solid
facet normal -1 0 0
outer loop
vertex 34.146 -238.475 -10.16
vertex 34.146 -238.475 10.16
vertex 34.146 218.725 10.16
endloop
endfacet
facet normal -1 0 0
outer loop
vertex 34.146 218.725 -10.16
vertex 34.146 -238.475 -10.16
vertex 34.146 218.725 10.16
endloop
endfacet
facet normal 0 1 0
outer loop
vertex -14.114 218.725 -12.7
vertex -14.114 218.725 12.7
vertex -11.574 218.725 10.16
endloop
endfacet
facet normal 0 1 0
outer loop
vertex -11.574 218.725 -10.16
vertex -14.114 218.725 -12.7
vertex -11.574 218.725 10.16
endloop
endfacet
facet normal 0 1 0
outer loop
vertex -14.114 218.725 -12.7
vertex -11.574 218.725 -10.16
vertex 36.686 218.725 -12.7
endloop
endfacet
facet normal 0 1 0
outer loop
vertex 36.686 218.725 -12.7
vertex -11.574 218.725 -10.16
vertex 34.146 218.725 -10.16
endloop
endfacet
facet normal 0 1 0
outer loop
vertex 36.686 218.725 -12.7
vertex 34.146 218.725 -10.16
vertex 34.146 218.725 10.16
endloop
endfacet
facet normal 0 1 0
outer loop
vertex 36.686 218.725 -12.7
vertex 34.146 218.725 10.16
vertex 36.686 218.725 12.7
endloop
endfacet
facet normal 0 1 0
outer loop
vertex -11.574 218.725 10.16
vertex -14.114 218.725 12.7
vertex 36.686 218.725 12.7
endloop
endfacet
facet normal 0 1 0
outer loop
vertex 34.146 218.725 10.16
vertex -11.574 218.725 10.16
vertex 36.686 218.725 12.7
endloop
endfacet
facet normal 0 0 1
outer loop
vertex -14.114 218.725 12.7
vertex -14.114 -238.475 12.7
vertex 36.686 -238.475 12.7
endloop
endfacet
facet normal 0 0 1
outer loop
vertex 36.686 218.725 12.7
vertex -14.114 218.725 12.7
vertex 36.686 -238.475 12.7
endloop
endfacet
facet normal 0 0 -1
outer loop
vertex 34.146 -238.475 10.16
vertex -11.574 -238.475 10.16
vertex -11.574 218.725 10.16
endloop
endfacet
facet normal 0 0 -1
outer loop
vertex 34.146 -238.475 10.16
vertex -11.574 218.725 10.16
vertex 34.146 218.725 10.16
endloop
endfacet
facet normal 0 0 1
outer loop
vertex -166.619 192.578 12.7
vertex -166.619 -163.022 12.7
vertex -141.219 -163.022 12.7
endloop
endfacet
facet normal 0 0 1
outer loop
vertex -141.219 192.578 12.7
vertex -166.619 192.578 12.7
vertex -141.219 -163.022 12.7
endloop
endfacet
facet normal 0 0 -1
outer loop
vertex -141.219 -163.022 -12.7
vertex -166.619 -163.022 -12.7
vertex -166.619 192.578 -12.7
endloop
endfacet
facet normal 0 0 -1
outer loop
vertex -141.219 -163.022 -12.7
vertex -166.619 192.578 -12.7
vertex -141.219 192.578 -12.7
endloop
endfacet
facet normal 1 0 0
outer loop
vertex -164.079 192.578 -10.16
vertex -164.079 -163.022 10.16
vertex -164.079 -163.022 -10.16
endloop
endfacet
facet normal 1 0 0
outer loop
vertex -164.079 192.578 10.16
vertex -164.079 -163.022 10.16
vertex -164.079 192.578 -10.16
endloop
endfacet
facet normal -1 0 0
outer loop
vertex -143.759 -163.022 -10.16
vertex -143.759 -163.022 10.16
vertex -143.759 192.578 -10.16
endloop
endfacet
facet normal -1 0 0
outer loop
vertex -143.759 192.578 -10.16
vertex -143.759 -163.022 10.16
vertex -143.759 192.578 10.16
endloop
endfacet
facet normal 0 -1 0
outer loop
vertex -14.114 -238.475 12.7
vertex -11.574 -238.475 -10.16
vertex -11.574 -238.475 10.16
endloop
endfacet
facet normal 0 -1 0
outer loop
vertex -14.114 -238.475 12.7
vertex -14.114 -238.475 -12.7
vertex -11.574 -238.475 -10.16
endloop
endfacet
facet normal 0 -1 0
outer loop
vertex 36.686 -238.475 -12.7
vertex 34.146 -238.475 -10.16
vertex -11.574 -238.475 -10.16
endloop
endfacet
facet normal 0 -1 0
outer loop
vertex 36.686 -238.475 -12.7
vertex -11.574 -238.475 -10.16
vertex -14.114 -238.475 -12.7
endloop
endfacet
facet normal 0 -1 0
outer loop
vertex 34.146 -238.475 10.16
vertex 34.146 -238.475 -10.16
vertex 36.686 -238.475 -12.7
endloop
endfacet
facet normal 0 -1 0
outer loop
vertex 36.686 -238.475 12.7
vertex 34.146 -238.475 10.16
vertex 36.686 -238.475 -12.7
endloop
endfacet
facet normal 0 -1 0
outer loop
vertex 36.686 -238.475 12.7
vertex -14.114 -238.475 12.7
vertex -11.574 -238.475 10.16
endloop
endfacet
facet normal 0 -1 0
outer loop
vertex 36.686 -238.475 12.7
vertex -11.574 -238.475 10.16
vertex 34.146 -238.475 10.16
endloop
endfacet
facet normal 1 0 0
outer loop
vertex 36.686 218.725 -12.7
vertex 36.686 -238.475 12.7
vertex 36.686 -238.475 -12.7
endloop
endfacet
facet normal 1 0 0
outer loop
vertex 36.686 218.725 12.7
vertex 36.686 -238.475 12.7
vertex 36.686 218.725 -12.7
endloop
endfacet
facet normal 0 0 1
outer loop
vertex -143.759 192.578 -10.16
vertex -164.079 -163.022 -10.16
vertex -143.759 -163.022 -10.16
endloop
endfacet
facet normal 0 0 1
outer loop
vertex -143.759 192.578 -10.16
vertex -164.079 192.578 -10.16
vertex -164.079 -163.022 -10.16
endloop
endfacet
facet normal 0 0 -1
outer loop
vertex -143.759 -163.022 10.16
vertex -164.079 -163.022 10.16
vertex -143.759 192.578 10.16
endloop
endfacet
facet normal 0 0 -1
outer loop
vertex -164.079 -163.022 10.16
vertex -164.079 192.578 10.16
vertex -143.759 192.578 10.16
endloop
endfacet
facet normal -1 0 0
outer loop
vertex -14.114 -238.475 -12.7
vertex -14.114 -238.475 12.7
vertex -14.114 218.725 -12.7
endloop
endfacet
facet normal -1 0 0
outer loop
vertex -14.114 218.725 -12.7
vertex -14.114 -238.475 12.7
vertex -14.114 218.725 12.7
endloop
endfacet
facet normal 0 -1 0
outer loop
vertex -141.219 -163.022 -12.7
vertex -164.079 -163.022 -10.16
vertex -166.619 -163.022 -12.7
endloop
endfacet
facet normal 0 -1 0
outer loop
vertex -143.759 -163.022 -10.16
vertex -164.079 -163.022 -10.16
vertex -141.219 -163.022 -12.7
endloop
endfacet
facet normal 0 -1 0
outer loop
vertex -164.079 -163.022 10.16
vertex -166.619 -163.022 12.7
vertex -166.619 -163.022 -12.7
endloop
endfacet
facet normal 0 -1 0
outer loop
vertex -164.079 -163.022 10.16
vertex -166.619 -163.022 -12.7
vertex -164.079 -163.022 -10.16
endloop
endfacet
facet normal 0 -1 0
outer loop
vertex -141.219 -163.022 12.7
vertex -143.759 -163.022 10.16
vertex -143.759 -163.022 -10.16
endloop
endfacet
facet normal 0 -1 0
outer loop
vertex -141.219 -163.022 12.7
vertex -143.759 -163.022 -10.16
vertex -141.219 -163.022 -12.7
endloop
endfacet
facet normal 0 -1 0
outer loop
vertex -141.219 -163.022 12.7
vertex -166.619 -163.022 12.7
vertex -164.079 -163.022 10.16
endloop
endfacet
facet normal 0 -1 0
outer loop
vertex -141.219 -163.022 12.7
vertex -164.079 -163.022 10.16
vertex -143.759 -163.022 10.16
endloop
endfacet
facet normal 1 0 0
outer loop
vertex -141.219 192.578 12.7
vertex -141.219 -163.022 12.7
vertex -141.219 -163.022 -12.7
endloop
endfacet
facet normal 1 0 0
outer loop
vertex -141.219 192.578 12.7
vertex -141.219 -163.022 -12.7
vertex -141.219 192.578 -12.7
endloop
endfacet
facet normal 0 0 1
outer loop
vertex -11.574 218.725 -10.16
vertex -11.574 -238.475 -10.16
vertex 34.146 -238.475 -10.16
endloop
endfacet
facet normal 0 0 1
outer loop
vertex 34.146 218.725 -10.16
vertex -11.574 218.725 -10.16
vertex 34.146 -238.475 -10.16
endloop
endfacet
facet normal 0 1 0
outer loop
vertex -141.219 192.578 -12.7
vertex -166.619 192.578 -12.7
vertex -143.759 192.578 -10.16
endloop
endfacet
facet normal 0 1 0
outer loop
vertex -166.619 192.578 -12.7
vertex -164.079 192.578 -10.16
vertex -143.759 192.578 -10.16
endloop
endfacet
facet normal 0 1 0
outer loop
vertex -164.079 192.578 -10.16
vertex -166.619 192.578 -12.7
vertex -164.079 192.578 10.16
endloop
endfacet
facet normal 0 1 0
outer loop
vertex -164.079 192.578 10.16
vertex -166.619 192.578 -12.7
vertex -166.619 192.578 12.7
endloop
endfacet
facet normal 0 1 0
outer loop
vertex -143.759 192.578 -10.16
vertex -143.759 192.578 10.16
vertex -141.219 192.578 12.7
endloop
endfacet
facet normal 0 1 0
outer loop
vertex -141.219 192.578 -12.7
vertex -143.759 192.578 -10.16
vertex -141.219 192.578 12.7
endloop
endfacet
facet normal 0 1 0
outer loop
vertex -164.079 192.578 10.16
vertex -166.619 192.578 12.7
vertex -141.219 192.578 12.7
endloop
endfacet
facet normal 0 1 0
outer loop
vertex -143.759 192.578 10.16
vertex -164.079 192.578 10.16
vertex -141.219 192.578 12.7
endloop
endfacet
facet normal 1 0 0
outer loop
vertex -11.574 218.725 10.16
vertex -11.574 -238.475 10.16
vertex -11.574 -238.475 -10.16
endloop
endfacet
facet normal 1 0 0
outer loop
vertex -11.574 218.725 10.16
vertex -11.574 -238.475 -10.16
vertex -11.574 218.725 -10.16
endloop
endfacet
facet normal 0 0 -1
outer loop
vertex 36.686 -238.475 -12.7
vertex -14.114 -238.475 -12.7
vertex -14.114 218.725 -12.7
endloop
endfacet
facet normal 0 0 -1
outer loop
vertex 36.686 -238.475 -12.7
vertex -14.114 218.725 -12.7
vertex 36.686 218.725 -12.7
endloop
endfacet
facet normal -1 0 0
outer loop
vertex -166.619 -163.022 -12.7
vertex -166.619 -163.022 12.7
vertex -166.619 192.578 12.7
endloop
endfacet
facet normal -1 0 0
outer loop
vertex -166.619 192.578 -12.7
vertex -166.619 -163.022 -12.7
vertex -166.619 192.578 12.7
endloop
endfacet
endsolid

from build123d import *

# Parameters (mm, degrees)
F0_W     = 50.8
F0_H     = 457.2
F1_DEPTH = 12.7
F2_T     = -2.54
F3_W     = 25.4
F3_H     = 355.6
F4_DEPTH = 12.7
F5_T     = -2.54


with BuildPart() as f1:
    # F0 (on Top) → F1 (new body, symmetric)
    with BuildSketch(Plane.XY):
        with Locations((11.285979, -9.875271)):
            Rectangle(F0_W, F0_H)
    extrude(amount=F1_DEPTH, both=True)

    # F2
    f2_openings = [f1.faces().sort_by_distance(p)[0] for p in [
        (11.285979, 218.724729, 0),
        (11.285979, -238.475271, 0),
    ]]
    offset(amount=F2_T, openings=f2_openings)


with BuildPart() as f4:
    # F3 (on Top) → F4 (new body, symmetric)
    with BuildSketch(Plane.XY):
        with Locations((-153.918764, 14.77845)):
            Rectangle(F3_W, F3_H)
    extrude(amount=F4_DEPTH, both=True)

    # F5
    f5_openings = [f4.faces().sort_by_distance(p)[0] for p in [
        (-153.918764, 192.57845, 0),
        (-153.918764, -163.02155, 0),
    ]]
    offset(amount=F5_T, openings=f5_openings)


solid = Compound([f1.part, f4.part])
